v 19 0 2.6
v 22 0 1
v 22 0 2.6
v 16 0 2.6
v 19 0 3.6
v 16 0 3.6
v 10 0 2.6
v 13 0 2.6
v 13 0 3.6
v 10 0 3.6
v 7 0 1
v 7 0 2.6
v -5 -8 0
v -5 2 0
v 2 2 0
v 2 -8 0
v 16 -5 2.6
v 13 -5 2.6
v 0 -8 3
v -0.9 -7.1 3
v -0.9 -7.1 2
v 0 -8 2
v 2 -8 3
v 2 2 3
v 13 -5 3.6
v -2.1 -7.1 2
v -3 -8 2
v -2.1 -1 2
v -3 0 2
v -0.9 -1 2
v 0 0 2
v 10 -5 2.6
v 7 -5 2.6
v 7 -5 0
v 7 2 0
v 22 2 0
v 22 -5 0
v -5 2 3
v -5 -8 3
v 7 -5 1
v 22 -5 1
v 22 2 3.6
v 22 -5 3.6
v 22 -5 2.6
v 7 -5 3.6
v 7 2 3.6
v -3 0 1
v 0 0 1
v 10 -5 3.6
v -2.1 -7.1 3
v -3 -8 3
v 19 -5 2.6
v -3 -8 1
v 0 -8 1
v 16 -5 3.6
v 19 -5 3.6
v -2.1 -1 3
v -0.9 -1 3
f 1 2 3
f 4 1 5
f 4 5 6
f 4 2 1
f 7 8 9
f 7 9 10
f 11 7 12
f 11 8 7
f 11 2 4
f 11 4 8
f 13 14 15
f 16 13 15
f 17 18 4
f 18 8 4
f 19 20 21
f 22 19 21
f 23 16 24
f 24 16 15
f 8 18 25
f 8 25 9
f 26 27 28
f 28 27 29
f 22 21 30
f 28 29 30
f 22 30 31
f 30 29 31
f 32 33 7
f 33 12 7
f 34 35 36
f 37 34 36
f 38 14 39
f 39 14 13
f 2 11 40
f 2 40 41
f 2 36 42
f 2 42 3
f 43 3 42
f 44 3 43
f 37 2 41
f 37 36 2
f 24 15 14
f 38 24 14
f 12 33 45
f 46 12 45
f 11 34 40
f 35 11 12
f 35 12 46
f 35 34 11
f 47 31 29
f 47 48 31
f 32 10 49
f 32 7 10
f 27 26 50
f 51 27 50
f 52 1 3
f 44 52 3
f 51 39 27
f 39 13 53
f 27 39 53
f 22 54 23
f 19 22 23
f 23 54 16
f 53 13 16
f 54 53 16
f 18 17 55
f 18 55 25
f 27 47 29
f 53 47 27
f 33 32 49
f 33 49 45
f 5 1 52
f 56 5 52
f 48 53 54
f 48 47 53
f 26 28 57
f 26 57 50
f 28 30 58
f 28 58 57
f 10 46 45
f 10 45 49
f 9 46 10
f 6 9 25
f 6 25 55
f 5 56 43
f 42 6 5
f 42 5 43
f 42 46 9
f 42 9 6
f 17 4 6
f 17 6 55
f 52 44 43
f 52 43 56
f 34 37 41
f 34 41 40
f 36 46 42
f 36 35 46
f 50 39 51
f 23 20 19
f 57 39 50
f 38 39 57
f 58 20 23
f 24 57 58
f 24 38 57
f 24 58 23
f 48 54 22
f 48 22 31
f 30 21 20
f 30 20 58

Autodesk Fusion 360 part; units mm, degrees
sketch "Sketch1" plane through (0, 0, 0) normal (0, 0, 1) x (1, 0, 0)
  line L0 (0, 0) -> (-3, 0)
  line L1 (-3, 0) -> (-3, -8)
  line L2 (-3, -8) -> (0, -8)
  line L3 (0, -8) -> (0, 0)
  line L4 (-5, -8) -> (2, -8)
  line L5 (2, -8) -> (2, 2)
  line L6 (2, 2) -> (-5, 2)
  line L7 (-5, 2) -> (-5, -8)
  line L8 (-2.1, -8) -> (-0.9, -8)
  line L9 (-0.9, -8) -> (-0.9, -1)
  line L10 (-0.9, -1) -> (-2.1, -1)
  line L11 (-2.1, -1) -> (-2.1, -8)
  dimension "d1" = 3
  dimension "d2" = 8
  dimension "d3" = 2
  dimension "d4" = 2
  dimension "d5" = 2
  dimension "d10" = 1.2
  dimension "d12" = 1
  dimension "d13" = 0.9
extrude "Extrude1" add sketch "Sketch1" along normal blind 1 contours L0 L1 L2 L3 L4 L9 L10 L11 | L2 L4 L8 L9 L10 L11 makes body 1
extrude "Extrude2" add sketch "Sketch1" along normal blind 2 contours L0 L1 L3 L4 L5 L6 L7 bodies 1
extrude "Extrude3" add sketch "Sketch1" along normal blind 1 from surface at 2 contours L0 L1 L2 L3 L4 L9 L10 L11 | L0 L1 L3 L4 L5 L6 L7 bodies 1
chamfer "Chamfer1" distance 0.9 angle 45 2 edges at (-2.1, -8, 2.5) (-0.9, -8, 2.5) on bodies 1
sketch "Sketch2" plane through (0, 0, 0) normal (0, 0, 1) x (1, 0, 0)
  line L0 (7, 2) -> (22, 2)
  line L1 (22, 2) -> (22, -5)
  line L2 (22, -5) -> (7, -5)
  line L3 (7, -5) -> (7, 2)
  line L4 (7, 2) -> (10, 2)
  line L5 (10, 2) -> (10, -5)
  line L6 (10, -5) -> (7, -5)
  line L7 (7, -5) -> (7, 2)
  line L8 (22, 2) -> (19, 2)
  line L9 (19, 2) -> (19, -5)
  line L10 (19, -5) -> (22, -5)
  line L11 (22, -5) -> (22, 2)
  line L12 (13, 2) -> (16, 2)
  line L13 (16, 2) -> (16, -5)
  line L14 (16, -5) -> (13, -5)
  line L15 (13, -5) -> (13, 2)
  line L16 (7, 2) -> (22, 2)
  line L17 (22, 2) -> (22, 0)
  line L18 (22, 0) -> (7, 0)
  line L19 (7, 0) -> (7, 2)
  dimension "d21" = 15
  dimension "d22" = 2
extrude "Extrude5" add sketch "Sketch2" along normal blind 1 separate body makes body 2
extrude "Extrude6" add sketch "Sketch2" along normal blind 3.6 contours L0 L3 L4 L5 L7 L16 L18 L19 | L0 L5 L15 L16 L18 | L0 L12 L13 L15 L16 L18 | L0 L9 L13 L16 L18 | L0 L1 L8 L9 L11 L16 L17 L18 bodies 2
extrude "Extrude7" add sketch "Sketch2" along normal blind 1 from surface at 2.6 contours L2 L3 L5 L6 L7 L18 | L2 L13 L14 L15 L18 | L1 L2 L9 L10 L11 L18 bodies 2
